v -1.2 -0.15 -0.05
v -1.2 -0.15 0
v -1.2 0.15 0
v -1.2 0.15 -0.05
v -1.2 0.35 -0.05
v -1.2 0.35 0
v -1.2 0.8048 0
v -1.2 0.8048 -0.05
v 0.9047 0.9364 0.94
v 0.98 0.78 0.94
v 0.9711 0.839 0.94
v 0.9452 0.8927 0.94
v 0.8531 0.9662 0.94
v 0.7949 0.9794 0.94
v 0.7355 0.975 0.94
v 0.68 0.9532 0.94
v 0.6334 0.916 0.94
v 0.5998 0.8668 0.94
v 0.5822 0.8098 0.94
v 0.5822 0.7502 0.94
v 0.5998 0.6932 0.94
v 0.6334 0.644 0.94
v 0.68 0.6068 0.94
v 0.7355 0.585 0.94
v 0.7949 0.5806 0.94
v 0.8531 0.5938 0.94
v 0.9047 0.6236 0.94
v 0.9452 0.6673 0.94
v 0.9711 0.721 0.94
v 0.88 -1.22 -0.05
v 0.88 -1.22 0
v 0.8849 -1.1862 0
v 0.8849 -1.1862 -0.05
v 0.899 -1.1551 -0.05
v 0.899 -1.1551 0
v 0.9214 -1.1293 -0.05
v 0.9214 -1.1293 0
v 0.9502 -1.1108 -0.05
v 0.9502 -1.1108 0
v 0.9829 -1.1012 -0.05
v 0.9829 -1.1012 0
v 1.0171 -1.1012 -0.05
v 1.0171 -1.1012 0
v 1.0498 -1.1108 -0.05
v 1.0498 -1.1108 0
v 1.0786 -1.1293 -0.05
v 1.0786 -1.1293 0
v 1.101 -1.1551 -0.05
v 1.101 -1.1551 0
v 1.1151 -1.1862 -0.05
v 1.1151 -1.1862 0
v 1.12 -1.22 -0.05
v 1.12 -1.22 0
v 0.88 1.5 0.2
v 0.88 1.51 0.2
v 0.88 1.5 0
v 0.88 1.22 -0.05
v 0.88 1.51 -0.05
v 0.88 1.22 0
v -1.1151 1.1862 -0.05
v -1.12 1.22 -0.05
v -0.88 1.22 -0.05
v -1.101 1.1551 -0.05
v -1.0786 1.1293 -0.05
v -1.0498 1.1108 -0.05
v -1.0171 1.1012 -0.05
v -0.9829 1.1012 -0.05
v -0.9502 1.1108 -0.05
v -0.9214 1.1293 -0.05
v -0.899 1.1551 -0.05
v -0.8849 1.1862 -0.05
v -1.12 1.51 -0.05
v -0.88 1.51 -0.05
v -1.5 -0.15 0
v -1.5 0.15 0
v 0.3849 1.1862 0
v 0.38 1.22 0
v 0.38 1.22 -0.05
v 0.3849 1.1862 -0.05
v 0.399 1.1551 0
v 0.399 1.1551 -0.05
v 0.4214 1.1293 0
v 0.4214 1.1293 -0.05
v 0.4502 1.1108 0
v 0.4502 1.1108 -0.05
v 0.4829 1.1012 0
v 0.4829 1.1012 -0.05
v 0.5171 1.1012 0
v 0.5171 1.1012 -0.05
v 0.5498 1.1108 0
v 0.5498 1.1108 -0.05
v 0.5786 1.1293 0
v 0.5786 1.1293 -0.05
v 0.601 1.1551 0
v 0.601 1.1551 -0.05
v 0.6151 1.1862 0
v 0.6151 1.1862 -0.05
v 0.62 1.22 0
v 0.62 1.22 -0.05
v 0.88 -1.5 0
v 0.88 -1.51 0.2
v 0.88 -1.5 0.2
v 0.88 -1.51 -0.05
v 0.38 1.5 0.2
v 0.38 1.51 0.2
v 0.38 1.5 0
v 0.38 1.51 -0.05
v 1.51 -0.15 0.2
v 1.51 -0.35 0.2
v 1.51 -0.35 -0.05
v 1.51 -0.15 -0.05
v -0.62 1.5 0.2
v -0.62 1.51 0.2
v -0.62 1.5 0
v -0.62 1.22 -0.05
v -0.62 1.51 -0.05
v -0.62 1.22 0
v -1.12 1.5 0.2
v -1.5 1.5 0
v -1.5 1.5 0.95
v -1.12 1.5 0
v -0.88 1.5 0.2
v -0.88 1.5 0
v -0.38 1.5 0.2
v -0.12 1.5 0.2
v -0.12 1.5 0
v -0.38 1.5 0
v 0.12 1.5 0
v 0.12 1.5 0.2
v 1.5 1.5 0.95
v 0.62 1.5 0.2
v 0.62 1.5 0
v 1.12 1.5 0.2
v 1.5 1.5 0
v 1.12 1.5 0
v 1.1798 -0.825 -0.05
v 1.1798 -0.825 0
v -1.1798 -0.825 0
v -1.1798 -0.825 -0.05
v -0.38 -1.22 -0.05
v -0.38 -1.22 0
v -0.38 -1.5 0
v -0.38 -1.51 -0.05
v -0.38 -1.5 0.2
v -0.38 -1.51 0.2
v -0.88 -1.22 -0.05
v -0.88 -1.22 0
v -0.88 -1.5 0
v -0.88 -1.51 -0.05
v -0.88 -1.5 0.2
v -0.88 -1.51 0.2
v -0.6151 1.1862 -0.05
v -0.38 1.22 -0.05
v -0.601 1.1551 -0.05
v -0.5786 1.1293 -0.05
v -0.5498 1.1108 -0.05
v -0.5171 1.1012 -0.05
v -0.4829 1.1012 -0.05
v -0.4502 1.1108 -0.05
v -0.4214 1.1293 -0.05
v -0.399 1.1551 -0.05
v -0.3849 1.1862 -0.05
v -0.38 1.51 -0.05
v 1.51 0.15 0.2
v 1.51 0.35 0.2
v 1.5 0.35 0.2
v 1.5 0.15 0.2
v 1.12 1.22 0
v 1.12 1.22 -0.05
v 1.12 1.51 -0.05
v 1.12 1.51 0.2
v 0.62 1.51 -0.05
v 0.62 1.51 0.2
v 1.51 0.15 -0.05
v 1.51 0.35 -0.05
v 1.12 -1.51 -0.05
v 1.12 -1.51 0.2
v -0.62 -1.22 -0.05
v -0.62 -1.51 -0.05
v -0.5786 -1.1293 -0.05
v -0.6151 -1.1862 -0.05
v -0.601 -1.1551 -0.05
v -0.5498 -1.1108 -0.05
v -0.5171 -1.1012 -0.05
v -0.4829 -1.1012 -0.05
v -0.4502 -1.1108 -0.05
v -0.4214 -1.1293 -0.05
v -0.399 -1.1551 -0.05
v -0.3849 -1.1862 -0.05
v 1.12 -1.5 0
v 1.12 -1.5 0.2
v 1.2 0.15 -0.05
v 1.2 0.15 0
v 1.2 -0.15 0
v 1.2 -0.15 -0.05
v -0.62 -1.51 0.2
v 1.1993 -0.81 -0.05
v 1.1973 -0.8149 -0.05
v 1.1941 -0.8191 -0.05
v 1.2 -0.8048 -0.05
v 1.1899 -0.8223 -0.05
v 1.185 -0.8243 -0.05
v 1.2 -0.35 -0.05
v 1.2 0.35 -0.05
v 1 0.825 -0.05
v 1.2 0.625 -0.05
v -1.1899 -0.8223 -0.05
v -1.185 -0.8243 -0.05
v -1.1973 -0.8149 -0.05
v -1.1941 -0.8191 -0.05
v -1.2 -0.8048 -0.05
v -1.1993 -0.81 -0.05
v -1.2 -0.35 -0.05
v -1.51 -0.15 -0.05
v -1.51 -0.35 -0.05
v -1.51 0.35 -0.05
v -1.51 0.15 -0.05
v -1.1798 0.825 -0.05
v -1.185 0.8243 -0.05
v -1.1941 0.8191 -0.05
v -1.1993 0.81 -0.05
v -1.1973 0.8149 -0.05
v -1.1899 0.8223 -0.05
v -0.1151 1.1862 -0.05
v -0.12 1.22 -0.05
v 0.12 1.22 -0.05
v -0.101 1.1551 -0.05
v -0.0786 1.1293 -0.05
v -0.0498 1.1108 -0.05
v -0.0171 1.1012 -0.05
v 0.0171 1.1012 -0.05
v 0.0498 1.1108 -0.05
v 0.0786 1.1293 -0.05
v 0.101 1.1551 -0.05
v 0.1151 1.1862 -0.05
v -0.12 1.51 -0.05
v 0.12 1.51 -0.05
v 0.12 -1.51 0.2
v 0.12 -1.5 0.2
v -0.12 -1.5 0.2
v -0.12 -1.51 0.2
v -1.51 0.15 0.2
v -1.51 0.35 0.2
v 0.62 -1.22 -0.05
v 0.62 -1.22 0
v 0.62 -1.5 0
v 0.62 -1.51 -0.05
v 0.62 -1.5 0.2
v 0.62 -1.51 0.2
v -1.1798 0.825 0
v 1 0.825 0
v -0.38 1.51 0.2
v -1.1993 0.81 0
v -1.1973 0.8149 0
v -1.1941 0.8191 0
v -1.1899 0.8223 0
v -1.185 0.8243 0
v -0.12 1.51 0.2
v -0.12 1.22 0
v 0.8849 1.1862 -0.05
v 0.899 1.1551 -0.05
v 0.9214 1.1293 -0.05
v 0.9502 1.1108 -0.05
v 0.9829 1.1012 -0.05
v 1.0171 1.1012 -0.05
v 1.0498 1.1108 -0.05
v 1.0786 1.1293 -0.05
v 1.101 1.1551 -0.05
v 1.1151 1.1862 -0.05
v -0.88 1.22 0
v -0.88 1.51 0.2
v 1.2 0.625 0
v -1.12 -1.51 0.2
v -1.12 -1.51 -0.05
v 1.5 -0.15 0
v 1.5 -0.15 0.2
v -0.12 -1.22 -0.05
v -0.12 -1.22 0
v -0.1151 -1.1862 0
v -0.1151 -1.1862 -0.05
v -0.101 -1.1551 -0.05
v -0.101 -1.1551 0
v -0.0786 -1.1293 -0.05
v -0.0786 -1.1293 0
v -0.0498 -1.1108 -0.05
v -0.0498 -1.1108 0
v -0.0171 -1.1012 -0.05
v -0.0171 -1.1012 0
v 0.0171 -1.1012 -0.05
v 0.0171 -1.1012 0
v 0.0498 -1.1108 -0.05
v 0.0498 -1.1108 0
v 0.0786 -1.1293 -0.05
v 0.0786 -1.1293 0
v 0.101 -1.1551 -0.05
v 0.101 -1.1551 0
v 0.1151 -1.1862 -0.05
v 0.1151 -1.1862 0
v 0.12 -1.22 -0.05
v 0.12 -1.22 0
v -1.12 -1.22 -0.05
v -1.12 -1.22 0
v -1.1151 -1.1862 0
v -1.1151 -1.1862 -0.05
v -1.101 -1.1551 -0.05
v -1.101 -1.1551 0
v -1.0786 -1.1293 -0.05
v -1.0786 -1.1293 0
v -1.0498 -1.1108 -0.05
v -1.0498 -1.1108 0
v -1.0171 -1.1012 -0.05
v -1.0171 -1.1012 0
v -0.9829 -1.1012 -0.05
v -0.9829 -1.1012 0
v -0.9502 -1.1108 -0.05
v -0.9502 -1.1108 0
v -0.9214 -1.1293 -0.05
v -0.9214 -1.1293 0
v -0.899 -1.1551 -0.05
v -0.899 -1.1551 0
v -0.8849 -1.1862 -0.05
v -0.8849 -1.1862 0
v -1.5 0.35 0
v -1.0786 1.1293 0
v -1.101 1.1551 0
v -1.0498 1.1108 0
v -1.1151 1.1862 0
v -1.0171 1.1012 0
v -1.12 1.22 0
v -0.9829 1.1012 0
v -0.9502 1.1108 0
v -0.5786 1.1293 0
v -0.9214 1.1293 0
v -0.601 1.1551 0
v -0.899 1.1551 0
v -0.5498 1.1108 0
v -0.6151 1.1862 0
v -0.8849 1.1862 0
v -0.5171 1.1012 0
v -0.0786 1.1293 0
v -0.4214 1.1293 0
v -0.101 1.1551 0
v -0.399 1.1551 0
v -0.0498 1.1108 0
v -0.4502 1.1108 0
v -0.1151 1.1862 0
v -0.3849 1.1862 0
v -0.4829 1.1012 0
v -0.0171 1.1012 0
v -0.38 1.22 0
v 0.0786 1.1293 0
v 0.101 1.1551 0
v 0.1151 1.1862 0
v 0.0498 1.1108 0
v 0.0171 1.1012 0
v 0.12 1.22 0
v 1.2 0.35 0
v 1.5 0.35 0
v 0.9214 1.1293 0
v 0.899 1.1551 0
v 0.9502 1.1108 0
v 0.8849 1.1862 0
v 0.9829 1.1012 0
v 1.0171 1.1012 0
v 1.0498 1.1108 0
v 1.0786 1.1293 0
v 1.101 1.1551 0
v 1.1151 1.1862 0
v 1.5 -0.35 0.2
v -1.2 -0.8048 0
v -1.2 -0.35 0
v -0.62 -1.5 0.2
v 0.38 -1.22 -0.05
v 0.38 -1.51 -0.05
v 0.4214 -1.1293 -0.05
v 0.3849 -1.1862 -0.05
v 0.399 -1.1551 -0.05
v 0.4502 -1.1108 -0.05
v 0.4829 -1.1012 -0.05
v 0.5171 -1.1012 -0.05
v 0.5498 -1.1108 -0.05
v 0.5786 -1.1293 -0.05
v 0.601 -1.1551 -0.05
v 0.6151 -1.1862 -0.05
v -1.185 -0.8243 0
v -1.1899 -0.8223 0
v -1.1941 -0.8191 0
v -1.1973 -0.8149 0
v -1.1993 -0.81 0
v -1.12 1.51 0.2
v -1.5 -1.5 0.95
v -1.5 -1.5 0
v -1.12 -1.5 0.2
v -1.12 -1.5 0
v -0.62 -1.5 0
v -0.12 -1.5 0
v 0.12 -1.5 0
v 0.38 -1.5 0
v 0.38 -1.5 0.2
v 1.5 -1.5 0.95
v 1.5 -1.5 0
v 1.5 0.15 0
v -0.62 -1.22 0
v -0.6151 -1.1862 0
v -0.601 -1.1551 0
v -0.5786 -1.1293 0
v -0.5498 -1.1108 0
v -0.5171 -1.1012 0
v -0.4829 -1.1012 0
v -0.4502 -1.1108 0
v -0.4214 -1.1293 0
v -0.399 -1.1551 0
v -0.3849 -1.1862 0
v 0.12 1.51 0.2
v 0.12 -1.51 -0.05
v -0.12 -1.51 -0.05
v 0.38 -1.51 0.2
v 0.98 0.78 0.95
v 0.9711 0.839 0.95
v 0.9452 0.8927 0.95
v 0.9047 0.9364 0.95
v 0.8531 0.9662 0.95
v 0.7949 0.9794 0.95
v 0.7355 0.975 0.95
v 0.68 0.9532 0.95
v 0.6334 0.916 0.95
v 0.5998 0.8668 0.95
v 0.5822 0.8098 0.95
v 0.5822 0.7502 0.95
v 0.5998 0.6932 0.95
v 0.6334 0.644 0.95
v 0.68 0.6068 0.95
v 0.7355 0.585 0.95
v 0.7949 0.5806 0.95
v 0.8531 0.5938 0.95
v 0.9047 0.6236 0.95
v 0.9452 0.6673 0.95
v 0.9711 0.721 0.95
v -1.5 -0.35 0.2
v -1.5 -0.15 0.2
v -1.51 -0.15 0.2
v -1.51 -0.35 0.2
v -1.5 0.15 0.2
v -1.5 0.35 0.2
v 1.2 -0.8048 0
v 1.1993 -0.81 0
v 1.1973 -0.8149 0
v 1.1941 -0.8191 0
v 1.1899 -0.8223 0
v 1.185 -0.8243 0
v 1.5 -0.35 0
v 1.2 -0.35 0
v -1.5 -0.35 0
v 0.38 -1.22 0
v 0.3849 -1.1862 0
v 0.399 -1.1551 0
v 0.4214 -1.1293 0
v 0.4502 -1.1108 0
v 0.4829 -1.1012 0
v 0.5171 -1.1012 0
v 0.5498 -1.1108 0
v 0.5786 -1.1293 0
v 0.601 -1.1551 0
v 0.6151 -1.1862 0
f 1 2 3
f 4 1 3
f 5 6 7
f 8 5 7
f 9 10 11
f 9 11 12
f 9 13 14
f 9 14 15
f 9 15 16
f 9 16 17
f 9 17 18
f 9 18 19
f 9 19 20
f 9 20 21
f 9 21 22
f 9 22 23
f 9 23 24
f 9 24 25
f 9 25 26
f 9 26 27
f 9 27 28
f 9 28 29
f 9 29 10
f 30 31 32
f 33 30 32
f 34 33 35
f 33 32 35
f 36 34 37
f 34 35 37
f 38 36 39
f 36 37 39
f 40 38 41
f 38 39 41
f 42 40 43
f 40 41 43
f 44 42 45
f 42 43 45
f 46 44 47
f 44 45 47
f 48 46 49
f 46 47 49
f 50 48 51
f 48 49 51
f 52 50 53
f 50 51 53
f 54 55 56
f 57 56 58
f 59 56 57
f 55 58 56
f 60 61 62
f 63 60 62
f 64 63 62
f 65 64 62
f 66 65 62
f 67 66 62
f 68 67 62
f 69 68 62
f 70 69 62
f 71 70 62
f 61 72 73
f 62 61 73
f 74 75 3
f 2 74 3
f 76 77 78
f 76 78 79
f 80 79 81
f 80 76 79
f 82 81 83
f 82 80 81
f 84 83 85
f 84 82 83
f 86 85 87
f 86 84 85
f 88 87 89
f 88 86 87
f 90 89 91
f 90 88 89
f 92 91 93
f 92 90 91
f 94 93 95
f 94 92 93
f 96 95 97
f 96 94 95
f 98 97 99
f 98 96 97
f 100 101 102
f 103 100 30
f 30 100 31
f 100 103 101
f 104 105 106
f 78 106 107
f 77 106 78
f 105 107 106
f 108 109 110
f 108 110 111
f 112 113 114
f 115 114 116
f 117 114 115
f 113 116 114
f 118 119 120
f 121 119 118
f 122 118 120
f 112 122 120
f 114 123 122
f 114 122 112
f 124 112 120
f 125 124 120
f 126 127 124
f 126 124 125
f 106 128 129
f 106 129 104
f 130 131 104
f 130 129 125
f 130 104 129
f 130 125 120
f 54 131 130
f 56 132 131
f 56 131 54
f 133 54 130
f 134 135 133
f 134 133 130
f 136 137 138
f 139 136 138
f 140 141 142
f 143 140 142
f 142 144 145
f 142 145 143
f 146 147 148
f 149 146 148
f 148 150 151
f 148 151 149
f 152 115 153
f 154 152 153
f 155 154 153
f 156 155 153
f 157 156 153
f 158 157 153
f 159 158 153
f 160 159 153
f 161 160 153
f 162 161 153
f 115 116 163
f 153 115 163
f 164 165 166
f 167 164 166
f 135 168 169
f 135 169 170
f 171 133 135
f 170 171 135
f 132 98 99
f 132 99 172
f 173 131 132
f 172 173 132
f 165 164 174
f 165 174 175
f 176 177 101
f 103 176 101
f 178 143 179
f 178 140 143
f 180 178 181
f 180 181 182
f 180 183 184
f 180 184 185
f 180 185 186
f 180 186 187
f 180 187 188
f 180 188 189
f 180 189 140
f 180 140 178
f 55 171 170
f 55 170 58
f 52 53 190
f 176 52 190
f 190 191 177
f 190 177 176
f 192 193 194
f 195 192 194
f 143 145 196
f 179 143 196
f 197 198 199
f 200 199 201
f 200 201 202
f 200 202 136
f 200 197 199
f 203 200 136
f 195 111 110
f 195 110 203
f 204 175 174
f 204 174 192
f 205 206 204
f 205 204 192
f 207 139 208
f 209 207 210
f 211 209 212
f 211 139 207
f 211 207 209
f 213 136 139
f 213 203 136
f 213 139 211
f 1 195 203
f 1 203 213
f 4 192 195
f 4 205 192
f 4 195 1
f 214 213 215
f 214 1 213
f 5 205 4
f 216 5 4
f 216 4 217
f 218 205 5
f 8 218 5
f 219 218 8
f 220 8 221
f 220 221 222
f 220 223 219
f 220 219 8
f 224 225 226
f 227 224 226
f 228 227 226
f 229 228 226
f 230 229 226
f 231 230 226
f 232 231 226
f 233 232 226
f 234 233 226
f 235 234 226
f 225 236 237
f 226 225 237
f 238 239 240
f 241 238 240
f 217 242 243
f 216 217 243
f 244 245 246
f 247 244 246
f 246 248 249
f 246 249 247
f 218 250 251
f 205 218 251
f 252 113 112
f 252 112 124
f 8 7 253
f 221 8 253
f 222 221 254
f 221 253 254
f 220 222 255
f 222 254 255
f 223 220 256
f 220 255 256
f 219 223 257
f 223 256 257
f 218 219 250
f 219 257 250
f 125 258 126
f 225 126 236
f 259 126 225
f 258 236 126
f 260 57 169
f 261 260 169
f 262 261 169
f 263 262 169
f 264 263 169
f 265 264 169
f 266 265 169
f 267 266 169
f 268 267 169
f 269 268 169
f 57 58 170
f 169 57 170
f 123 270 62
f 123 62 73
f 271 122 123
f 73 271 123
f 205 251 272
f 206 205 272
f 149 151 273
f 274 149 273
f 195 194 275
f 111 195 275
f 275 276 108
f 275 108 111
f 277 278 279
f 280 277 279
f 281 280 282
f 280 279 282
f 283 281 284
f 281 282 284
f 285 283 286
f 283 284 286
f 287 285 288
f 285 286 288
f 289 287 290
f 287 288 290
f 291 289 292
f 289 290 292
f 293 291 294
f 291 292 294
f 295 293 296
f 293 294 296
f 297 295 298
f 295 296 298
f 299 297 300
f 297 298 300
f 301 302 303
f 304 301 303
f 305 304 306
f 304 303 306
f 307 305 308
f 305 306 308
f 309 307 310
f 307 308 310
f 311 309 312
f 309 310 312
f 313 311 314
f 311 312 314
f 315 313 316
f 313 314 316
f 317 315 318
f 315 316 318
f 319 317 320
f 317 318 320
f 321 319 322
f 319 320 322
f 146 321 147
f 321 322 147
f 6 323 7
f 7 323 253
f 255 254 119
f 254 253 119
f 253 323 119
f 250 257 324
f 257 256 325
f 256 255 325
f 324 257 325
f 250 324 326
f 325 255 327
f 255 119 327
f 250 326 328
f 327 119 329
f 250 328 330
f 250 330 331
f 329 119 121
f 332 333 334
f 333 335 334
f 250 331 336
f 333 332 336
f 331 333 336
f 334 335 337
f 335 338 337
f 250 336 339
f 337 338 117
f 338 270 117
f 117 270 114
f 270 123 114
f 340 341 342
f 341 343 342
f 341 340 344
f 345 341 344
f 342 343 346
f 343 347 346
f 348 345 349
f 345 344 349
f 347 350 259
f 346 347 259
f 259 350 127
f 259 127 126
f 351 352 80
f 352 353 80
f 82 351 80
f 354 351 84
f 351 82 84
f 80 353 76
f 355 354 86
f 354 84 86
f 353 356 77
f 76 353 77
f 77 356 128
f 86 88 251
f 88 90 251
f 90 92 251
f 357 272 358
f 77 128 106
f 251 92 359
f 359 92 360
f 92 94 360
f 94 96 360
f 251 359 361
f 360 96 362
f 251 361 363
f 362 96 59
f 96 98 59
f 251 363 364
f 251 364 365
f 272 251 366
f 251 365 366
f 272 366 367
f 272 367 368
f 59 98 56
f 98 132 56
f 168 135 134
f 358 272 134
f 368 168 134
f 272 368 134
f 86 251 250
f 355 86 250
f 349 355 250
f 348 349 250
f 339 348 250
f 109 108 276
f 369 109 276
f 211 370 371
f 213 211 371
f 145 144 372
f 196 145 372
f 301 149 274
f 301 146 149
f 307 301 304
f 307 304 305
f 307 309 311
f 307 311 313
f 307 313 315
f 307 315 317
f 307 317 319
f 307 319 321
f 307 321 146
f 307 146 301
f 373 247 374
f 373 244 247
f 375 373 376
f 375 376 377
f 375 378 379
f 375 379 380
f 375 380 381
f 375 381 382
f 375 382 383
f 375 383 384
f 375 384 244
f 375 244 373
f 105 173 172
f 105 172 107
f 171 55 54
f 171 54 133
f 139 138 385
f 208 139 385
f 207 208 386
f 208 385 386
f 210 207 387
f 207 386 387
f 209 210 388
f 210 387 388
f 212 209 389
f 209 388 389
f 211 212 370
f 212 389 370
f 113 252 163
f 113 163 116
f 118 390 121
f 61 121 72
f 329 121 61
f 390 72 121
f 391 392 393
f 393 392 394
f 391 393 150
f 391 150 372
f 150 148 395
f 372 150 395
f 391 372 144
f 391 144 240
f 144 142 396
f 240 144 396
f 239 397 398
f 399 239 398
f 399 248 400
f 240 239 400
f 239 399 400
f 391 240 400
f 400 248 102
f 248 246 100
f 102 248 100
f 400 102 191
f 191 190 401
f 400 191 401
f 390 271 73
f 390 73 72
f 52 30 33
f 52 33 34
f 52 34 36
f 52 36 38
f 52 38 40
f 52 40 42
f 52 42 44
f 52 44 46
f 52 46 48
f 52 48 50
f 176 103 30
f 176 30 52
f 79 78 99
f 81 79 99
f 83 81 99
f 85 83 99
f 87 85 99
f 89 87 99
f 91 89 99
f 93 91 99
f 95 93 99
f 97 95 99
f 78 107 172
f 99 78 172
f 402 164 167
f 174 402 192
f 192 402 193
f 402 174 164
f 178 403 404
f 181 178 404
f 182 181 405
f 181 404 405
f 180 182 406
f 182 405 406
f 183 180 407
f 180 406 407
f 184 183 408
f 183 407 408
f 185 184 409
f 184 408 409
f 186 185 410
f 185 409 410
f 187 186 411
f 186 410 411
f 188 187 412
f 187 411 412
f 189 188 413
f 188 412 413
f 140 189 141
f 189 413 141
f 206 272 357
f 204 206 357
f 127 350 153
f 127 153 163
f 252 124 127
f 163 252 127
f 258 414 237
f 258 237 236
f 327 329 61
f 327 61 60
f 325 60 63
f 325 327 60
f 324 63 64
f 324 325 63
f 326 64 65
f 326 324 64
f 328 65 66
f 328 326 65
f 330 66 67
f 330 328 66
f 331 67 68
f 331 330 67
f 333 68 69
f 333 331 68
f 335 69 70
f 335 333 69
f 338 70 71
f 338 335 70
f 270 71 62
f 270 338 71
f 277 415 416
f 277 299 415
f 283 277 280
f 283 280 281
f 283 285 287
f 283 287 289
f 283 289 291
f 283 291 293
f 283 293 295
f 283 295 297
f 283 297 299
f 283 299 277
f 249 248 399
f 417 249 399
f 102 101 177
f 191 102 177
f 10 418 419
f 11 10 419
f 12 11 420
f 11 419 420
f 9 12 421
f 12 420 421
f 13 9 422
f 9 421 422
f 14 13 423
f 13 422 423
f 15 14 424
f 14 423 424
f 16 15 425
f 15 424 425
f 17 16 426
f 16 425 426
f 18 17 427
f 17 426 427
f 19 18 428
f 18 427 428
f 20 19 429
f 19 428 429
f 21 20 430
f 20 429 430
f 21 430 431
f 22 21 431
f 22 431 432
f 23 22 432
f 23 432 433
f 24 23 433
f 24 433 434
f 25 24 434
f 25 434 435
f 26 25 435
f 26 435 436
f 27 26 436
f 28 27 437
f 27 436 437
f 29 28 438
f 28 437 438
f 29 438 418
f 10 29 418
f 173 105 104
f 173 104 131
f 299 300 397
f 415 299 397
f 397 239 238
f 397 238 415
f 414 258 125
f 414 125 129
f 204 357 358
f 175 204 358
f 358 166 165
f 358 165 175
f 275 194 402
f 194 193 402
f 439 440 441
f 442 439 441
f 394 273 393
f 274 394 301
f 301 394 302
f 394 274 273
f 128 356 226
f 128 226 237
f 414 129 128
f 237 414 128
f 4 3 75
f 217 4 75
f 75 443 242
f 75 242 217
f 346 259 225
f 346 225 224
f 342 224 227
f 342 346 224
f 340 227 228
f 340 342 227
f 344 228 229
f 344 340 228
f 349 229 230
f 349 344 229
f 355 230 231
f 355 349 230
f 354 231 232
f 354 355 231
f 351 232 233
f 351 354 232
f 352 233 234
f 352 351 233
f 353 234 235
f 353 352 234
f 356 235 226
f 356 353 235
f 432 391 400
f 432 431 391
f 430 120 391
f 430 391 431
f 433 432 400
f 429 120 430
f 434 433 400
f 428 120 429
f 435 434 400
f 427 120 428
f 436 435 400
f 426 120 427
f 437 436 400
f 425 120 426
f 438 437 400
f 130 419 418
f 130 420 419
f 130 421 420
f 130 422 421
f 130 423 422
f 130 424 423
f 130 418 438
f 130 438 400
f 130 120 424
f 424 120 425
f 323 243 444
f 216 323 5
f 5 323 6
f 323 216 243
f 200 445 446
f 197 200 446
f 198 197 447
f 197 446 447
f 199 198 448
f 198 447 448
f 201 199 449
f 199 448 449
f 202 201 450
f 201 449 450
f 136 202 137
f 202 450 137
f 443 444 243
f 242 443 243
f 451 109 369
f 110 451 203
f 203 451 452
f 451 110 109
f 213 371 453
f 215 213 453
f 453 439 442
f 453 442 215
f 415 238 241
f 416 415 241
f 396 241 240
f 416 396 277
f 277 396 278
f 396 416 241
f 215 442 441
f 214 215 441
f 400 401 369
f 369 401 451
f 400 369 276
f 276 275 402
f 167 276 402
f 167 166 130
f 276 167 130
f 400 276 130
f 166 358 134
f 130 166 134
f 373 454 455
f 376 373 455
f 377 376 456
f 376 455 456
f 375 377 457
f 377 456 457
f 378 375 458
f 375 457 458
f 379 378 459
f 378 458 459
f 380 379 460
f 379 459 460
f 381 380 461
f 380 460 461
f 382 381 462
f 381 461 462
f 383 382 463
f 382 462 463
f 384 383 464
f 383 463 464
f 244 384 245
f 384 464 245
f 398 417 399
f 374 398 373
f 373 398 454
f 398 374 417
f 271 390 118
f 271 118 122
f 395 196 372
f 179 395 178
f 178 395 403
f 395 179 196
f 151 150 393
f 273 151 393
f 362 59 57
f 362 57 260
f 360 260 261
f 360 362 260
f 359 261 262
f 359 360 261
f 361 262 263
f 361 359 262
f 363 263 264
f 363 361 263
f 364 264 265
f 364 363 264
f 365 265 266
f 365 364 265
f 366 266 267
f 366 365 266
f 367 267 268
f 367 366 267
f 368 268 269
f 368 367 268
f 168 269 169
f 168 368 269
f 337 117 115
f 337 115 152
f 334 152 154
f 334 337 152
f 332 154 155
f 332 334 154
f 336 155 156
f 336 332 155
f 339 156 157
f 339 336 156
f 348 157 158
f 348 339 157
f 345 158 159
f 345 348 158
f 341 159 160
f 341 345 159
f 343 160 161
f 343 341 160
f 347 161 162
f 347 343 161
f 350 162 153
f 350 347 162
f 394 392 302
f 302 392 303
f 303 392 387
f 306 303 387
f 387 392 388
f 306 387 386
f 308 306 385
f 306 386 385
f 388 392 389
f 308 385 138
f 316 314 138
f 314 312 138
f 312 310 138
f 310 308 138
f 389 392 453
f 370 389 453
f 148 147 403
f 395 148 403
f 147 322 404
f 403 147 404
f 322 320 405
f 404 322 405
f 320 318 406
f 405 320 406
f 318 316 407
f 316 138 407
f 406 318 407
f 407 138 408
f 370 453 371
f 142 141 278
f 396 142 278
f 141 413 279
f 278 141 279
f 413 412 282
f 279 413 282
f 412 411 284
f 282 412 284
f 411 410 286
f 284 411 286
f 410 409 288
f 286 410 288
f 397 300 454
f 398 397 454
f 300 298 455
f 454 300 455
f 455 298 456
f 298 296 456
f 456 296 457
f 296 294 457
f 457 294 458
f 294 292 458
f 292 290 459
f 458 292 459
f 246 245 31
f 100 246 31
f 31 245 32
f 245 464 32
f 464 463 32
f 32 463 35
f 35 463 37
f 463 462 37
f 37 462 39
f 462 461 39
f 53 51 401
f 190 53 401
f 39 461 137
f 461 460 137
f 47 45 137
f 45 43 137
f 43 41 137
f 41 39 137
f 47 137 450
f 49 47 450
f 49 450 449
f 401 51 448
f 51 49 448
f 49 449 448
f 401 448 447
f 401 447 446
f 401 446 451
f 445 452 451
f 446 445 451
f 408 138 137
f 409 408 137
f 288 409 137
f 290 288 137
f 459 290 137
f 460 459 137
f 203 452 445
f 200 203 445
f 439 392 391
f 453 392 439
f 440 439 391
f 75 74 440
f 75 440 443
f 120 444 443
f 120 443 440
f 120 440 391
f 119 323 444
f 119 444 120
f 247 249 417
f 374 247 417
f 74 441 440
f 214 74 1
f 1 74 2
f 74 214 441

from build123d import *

# Parameters (mm, degrees)
SKETCH1_W                = 3
SKETCH1_H                = 3
BOSS_EXTRUDE1_DEPTH      = 0.95
SKETCH2_R                = 0.2
CUT_EXTRUDE1_DEPTH       = 0.01
BOSS_EXTRUDE2_DEPTH      = 0.05
BOSS_EXTRUDE2_DEPTH_BACK = 0.2
SKETCH3_W                = 0.01
SKETCH3_H                = 0.2
BOSS_EXTRUDE4_START      = -0.2
BOSS_EXTRUDE4_DEPTH      = 0.25
LPATTERN2_COUNT          = 5
LPATTERN2_PITCH          = 0.5
MIRROR2_START            = -0.2
MIRROR2_COPY_1_DEPTH     = 0.25
MIRROR2_COPY_2_DEPTH     = 0.25
MIRROR2_COPY_3_DEPTH     = 0.25
MIRROR2_COPY_4_DEPTH     = 0.25


with BuildPart() as part:
    # Sketch1 → Boss-Extrude1 (new body)
    with BuildSketch(Plane.XY):
        Rectangle(SKETCH1_W, SKETCH1_H)
    extrude(amount=BOSS_EXTRUDE1_DEPTH)

    # Sketch2 → Cut-Extrude1 (cut)
    with BuildSketch(Plane.XY.offset(0.95)):
        with Locations((0.78, 0.78)):
            Circle(SKETCH2_R)
    extrude(amount=-CUT_EXTRUDE1_DEPTH, mode=Mode.SUBTRACT)

    # Sketch3 → Boss-Extrude2 (add, two sides: drawn at the far end of the back side and taken through both)
    with BuildSketch(Plane(origin=(0, 0, 0), x_dir=(-1, 0, 0), z_dir=(0, 0, -1)).offset(-BOSS_EXTRUDE2_DEPTH_BACK)):
        with BuildLine():
            Line((1.5, 0.35), (1.2, 0.35))
            Line((1.2, 0.35), (1.2, 0.80475))
            ThreePointArc((1.2, 0.80475), (1.194068912, 0.819068912), (1.17975, 0.825))
            Line((1.17975, 0.825), (-1, 0.825))
            Line((-1, 0.825), (-1.2, 0.625))
            Line((-1.2, 0.625), (-1.2, 0.35))
            Line((-1.2, 0.35), (-1.5, 0.35))
            Line((-1.5, 0.35), (-1.5, 0.15))
            Line((-1.5, 0.15), (-1.2, 0.15))
            Line((-1.2, 0.15), (-1.2, -0.15))
            Line((-1.2, -0.15), (-1.5, -0.15))
            Line((-1.5, -0.15), (-1.5, -0.35))
            Line((-1.5, -0.35), (-1.2, -0.35))
            Line((-1.2, -0.35), (-1.2, -0.80475))
            ThreePointArc((-1.2, -0.80475), (-1.194068912, -0.819068912), (-1.17975, -0.825))
            Line((-1.17975, -0.825), (1.17975, -0.825))
            ThreePointArc((1.17975, -0.825), (1.194068912, -0.819068912), (1.2, -0.80475))
            Line((1.2, -0.80475), (1.2, -0.35))
            Line((1.2, -0.35), (1.5, -0.35))
            Line((1.5, -0.35), (1.5, -0.15))
            Line((1.5, -0.15), (1.2, -0.15))
            Line((1.2, -0.15), (1.2, 0.15))
            Line((1.2, 0.15), (1.5, 0.15))
            Line((1.5, 0.15), (1.5, 0.35))
        make_face()
        with Locations((1.505, 0.25)):
            Rectangle(SKETCH3_W, SKETCH3_H)
        with Locations((1.505, -0.25)):
            Rectangle(SKETCH3_W, SKETCH3_H)
        with Locations((-1.505, -0.25)):
            Rectangle(SKETCH3_W, SKETCH3_H)
        with Locations((-1.505, 0.25)):
            Rectangle(SKETCH3_W, SKETCH3_H)
    extrude(amount=BOSS_EXTRUDE2_DEPTH + BOSS_EXTRUDE2_DEPTH_BACK)

    # Sketch6 → Boss-Extrude4 (add)
    with BuildSketch(Plane(origin=(0, 0, 0), x_dir=(-1, 0, 0), z_dir=(0, 0, -1)).offset(BOSS_EXTRUDE4_START)):
        with BuildLine():
            Line((-1.12, 1.51), (-0.88, 1.51))
            Line((-0.88, 1.51), (-0.88, 1.5))
            Line((-0.88, 1.5), (-0.88, 1.22))
            ThreePointArc((-0.88, 1.22), (-1, 1.1), (-1.12, 1.22))
            Line((-1.12, 1.22), (-1.12, 1.5))
            Line((-1.12, 1.5), (-1.12, 1.51))
        make_face()
    boss_extrude4 = extrude(amount=BOSS_EXTRUDE4_DEPTH)

    # LPattern2: Boss-Extrude4 ×5
    with Locations(*[(-i * LPATTERN2_PITCH, 0, 0) for i in range(1, LPATTERN2_COUNT)]):
        add(boss_extrude4)

    # Mirror2: Boss-Extrude4 across plane
    add(boss_extrude4.mirror(Plane.ZX))

    # Mirror2 copy 1 sketch → Mirror2 copy 1 (add)
    with BuildSketch(Plane(origin=(-0.5, 0, 0), x_dir=(-1, 0, 0), z_dir=(0, 0, -1)).offset(MIRROR2_START)):
        with BuildLine():
            Line((-1.12, -1.51), (-0.88, -1.51))
            Line((-0.88, -1.51), (-0.88, -1.5))
            Line((-0.88, -1.5), (-0.88, -1.22))
            ThreePointArc((-0.88, -1.22), (-1, -1.1), (-1.12, -1.22))
            Line((-1.12, -1.22), (-1.12, -1.5))
            Line((-1.12, -1.5), (-1.12, -1.51))
        make_face()
    extrude(amount=MIRROR2_COPY_1_DEPTH)

    # Mirror2 copy 2 sketch → Mirror2 copy 2 (add)
    with BuildSketch(Plane(origin=(-1, 0, 0), x_dir=(-1, 0, 0), z_dir=(0, 0, -1)).offset(MIRROR2_START)):
        with BuildLine():
            Line((-1.12, -1.51), (-0.88, -1.51))
            Line((-0.88, -1.51), (-0.88, -1.5))
            Line((-0.88, -1.5), (-0.88, -1.22))
            ThreePointArc((-0.88, -1.22), (-1, -1.1), (-1.12, -1.22))
            Line((-1.12, -1.22), (-1.12, -1.5))
            Line((-1.12, -1.5), (-1.12, -1.51))
        make_face()
    extrude(amount=MIRROR2_COPY_2_DEPTH)

    # Mirror2 copy 3 sketch → Mirror2 copy 3 (add)
    with BuildSketch(Plane(origin=(-1.5, 0, 0), x_dir=(-1, 0, 0), z_dir=(0, 0, -1)).offset(MIRROR2_START)):
        with BuildLine():
            Line((-1.12, -1.51), (-0.88, -1.51))
            Line((-0.88, -1.51), (-0.88, -1.5))
            Line((-0.88, -1.5), (-0.88, -1.22))
            ThreePointArc((-0.88, -1.22), (-1, -1.1), (-1.12, -1.22))
            Line((-1.12, -1.22), (-1.12, -1.5))
            Line((-1.12, -1.5), (-1.12, -1.51))
        make_face()
    extrude(amount=MIRROR2_COPY_3_DEPTH)

    # Mirror2 copy 4 sketch → Mirror2 copy 4 (add)
    with BuildSketch(Plane(origin=(-2, 0, 0), x_dir=(-1, 0, 0), z_dir=(0, 0, -1)).offset(MIRROR2_START)):
        with BuildLine():
            Line((-1.12, -1.51), (-0.88, -1.51))
            Line((-0.88, -1.51), (-0.88, -1.5))
            Line((-0.88, -1.5), (-0.88, -1.22))
            ThreePointArc((-0.88, -1.22), (-1, -1.1), (-1.12, -1.22))
            Line((-1.12, -1.22), (-1.12, -1.5))
            Line((-1.12, -1.5), (-1.12, -1.51))
        make_face()
    extrude(amount=MIRROR2_COPY_4_DEPTH)


solid = part.part
